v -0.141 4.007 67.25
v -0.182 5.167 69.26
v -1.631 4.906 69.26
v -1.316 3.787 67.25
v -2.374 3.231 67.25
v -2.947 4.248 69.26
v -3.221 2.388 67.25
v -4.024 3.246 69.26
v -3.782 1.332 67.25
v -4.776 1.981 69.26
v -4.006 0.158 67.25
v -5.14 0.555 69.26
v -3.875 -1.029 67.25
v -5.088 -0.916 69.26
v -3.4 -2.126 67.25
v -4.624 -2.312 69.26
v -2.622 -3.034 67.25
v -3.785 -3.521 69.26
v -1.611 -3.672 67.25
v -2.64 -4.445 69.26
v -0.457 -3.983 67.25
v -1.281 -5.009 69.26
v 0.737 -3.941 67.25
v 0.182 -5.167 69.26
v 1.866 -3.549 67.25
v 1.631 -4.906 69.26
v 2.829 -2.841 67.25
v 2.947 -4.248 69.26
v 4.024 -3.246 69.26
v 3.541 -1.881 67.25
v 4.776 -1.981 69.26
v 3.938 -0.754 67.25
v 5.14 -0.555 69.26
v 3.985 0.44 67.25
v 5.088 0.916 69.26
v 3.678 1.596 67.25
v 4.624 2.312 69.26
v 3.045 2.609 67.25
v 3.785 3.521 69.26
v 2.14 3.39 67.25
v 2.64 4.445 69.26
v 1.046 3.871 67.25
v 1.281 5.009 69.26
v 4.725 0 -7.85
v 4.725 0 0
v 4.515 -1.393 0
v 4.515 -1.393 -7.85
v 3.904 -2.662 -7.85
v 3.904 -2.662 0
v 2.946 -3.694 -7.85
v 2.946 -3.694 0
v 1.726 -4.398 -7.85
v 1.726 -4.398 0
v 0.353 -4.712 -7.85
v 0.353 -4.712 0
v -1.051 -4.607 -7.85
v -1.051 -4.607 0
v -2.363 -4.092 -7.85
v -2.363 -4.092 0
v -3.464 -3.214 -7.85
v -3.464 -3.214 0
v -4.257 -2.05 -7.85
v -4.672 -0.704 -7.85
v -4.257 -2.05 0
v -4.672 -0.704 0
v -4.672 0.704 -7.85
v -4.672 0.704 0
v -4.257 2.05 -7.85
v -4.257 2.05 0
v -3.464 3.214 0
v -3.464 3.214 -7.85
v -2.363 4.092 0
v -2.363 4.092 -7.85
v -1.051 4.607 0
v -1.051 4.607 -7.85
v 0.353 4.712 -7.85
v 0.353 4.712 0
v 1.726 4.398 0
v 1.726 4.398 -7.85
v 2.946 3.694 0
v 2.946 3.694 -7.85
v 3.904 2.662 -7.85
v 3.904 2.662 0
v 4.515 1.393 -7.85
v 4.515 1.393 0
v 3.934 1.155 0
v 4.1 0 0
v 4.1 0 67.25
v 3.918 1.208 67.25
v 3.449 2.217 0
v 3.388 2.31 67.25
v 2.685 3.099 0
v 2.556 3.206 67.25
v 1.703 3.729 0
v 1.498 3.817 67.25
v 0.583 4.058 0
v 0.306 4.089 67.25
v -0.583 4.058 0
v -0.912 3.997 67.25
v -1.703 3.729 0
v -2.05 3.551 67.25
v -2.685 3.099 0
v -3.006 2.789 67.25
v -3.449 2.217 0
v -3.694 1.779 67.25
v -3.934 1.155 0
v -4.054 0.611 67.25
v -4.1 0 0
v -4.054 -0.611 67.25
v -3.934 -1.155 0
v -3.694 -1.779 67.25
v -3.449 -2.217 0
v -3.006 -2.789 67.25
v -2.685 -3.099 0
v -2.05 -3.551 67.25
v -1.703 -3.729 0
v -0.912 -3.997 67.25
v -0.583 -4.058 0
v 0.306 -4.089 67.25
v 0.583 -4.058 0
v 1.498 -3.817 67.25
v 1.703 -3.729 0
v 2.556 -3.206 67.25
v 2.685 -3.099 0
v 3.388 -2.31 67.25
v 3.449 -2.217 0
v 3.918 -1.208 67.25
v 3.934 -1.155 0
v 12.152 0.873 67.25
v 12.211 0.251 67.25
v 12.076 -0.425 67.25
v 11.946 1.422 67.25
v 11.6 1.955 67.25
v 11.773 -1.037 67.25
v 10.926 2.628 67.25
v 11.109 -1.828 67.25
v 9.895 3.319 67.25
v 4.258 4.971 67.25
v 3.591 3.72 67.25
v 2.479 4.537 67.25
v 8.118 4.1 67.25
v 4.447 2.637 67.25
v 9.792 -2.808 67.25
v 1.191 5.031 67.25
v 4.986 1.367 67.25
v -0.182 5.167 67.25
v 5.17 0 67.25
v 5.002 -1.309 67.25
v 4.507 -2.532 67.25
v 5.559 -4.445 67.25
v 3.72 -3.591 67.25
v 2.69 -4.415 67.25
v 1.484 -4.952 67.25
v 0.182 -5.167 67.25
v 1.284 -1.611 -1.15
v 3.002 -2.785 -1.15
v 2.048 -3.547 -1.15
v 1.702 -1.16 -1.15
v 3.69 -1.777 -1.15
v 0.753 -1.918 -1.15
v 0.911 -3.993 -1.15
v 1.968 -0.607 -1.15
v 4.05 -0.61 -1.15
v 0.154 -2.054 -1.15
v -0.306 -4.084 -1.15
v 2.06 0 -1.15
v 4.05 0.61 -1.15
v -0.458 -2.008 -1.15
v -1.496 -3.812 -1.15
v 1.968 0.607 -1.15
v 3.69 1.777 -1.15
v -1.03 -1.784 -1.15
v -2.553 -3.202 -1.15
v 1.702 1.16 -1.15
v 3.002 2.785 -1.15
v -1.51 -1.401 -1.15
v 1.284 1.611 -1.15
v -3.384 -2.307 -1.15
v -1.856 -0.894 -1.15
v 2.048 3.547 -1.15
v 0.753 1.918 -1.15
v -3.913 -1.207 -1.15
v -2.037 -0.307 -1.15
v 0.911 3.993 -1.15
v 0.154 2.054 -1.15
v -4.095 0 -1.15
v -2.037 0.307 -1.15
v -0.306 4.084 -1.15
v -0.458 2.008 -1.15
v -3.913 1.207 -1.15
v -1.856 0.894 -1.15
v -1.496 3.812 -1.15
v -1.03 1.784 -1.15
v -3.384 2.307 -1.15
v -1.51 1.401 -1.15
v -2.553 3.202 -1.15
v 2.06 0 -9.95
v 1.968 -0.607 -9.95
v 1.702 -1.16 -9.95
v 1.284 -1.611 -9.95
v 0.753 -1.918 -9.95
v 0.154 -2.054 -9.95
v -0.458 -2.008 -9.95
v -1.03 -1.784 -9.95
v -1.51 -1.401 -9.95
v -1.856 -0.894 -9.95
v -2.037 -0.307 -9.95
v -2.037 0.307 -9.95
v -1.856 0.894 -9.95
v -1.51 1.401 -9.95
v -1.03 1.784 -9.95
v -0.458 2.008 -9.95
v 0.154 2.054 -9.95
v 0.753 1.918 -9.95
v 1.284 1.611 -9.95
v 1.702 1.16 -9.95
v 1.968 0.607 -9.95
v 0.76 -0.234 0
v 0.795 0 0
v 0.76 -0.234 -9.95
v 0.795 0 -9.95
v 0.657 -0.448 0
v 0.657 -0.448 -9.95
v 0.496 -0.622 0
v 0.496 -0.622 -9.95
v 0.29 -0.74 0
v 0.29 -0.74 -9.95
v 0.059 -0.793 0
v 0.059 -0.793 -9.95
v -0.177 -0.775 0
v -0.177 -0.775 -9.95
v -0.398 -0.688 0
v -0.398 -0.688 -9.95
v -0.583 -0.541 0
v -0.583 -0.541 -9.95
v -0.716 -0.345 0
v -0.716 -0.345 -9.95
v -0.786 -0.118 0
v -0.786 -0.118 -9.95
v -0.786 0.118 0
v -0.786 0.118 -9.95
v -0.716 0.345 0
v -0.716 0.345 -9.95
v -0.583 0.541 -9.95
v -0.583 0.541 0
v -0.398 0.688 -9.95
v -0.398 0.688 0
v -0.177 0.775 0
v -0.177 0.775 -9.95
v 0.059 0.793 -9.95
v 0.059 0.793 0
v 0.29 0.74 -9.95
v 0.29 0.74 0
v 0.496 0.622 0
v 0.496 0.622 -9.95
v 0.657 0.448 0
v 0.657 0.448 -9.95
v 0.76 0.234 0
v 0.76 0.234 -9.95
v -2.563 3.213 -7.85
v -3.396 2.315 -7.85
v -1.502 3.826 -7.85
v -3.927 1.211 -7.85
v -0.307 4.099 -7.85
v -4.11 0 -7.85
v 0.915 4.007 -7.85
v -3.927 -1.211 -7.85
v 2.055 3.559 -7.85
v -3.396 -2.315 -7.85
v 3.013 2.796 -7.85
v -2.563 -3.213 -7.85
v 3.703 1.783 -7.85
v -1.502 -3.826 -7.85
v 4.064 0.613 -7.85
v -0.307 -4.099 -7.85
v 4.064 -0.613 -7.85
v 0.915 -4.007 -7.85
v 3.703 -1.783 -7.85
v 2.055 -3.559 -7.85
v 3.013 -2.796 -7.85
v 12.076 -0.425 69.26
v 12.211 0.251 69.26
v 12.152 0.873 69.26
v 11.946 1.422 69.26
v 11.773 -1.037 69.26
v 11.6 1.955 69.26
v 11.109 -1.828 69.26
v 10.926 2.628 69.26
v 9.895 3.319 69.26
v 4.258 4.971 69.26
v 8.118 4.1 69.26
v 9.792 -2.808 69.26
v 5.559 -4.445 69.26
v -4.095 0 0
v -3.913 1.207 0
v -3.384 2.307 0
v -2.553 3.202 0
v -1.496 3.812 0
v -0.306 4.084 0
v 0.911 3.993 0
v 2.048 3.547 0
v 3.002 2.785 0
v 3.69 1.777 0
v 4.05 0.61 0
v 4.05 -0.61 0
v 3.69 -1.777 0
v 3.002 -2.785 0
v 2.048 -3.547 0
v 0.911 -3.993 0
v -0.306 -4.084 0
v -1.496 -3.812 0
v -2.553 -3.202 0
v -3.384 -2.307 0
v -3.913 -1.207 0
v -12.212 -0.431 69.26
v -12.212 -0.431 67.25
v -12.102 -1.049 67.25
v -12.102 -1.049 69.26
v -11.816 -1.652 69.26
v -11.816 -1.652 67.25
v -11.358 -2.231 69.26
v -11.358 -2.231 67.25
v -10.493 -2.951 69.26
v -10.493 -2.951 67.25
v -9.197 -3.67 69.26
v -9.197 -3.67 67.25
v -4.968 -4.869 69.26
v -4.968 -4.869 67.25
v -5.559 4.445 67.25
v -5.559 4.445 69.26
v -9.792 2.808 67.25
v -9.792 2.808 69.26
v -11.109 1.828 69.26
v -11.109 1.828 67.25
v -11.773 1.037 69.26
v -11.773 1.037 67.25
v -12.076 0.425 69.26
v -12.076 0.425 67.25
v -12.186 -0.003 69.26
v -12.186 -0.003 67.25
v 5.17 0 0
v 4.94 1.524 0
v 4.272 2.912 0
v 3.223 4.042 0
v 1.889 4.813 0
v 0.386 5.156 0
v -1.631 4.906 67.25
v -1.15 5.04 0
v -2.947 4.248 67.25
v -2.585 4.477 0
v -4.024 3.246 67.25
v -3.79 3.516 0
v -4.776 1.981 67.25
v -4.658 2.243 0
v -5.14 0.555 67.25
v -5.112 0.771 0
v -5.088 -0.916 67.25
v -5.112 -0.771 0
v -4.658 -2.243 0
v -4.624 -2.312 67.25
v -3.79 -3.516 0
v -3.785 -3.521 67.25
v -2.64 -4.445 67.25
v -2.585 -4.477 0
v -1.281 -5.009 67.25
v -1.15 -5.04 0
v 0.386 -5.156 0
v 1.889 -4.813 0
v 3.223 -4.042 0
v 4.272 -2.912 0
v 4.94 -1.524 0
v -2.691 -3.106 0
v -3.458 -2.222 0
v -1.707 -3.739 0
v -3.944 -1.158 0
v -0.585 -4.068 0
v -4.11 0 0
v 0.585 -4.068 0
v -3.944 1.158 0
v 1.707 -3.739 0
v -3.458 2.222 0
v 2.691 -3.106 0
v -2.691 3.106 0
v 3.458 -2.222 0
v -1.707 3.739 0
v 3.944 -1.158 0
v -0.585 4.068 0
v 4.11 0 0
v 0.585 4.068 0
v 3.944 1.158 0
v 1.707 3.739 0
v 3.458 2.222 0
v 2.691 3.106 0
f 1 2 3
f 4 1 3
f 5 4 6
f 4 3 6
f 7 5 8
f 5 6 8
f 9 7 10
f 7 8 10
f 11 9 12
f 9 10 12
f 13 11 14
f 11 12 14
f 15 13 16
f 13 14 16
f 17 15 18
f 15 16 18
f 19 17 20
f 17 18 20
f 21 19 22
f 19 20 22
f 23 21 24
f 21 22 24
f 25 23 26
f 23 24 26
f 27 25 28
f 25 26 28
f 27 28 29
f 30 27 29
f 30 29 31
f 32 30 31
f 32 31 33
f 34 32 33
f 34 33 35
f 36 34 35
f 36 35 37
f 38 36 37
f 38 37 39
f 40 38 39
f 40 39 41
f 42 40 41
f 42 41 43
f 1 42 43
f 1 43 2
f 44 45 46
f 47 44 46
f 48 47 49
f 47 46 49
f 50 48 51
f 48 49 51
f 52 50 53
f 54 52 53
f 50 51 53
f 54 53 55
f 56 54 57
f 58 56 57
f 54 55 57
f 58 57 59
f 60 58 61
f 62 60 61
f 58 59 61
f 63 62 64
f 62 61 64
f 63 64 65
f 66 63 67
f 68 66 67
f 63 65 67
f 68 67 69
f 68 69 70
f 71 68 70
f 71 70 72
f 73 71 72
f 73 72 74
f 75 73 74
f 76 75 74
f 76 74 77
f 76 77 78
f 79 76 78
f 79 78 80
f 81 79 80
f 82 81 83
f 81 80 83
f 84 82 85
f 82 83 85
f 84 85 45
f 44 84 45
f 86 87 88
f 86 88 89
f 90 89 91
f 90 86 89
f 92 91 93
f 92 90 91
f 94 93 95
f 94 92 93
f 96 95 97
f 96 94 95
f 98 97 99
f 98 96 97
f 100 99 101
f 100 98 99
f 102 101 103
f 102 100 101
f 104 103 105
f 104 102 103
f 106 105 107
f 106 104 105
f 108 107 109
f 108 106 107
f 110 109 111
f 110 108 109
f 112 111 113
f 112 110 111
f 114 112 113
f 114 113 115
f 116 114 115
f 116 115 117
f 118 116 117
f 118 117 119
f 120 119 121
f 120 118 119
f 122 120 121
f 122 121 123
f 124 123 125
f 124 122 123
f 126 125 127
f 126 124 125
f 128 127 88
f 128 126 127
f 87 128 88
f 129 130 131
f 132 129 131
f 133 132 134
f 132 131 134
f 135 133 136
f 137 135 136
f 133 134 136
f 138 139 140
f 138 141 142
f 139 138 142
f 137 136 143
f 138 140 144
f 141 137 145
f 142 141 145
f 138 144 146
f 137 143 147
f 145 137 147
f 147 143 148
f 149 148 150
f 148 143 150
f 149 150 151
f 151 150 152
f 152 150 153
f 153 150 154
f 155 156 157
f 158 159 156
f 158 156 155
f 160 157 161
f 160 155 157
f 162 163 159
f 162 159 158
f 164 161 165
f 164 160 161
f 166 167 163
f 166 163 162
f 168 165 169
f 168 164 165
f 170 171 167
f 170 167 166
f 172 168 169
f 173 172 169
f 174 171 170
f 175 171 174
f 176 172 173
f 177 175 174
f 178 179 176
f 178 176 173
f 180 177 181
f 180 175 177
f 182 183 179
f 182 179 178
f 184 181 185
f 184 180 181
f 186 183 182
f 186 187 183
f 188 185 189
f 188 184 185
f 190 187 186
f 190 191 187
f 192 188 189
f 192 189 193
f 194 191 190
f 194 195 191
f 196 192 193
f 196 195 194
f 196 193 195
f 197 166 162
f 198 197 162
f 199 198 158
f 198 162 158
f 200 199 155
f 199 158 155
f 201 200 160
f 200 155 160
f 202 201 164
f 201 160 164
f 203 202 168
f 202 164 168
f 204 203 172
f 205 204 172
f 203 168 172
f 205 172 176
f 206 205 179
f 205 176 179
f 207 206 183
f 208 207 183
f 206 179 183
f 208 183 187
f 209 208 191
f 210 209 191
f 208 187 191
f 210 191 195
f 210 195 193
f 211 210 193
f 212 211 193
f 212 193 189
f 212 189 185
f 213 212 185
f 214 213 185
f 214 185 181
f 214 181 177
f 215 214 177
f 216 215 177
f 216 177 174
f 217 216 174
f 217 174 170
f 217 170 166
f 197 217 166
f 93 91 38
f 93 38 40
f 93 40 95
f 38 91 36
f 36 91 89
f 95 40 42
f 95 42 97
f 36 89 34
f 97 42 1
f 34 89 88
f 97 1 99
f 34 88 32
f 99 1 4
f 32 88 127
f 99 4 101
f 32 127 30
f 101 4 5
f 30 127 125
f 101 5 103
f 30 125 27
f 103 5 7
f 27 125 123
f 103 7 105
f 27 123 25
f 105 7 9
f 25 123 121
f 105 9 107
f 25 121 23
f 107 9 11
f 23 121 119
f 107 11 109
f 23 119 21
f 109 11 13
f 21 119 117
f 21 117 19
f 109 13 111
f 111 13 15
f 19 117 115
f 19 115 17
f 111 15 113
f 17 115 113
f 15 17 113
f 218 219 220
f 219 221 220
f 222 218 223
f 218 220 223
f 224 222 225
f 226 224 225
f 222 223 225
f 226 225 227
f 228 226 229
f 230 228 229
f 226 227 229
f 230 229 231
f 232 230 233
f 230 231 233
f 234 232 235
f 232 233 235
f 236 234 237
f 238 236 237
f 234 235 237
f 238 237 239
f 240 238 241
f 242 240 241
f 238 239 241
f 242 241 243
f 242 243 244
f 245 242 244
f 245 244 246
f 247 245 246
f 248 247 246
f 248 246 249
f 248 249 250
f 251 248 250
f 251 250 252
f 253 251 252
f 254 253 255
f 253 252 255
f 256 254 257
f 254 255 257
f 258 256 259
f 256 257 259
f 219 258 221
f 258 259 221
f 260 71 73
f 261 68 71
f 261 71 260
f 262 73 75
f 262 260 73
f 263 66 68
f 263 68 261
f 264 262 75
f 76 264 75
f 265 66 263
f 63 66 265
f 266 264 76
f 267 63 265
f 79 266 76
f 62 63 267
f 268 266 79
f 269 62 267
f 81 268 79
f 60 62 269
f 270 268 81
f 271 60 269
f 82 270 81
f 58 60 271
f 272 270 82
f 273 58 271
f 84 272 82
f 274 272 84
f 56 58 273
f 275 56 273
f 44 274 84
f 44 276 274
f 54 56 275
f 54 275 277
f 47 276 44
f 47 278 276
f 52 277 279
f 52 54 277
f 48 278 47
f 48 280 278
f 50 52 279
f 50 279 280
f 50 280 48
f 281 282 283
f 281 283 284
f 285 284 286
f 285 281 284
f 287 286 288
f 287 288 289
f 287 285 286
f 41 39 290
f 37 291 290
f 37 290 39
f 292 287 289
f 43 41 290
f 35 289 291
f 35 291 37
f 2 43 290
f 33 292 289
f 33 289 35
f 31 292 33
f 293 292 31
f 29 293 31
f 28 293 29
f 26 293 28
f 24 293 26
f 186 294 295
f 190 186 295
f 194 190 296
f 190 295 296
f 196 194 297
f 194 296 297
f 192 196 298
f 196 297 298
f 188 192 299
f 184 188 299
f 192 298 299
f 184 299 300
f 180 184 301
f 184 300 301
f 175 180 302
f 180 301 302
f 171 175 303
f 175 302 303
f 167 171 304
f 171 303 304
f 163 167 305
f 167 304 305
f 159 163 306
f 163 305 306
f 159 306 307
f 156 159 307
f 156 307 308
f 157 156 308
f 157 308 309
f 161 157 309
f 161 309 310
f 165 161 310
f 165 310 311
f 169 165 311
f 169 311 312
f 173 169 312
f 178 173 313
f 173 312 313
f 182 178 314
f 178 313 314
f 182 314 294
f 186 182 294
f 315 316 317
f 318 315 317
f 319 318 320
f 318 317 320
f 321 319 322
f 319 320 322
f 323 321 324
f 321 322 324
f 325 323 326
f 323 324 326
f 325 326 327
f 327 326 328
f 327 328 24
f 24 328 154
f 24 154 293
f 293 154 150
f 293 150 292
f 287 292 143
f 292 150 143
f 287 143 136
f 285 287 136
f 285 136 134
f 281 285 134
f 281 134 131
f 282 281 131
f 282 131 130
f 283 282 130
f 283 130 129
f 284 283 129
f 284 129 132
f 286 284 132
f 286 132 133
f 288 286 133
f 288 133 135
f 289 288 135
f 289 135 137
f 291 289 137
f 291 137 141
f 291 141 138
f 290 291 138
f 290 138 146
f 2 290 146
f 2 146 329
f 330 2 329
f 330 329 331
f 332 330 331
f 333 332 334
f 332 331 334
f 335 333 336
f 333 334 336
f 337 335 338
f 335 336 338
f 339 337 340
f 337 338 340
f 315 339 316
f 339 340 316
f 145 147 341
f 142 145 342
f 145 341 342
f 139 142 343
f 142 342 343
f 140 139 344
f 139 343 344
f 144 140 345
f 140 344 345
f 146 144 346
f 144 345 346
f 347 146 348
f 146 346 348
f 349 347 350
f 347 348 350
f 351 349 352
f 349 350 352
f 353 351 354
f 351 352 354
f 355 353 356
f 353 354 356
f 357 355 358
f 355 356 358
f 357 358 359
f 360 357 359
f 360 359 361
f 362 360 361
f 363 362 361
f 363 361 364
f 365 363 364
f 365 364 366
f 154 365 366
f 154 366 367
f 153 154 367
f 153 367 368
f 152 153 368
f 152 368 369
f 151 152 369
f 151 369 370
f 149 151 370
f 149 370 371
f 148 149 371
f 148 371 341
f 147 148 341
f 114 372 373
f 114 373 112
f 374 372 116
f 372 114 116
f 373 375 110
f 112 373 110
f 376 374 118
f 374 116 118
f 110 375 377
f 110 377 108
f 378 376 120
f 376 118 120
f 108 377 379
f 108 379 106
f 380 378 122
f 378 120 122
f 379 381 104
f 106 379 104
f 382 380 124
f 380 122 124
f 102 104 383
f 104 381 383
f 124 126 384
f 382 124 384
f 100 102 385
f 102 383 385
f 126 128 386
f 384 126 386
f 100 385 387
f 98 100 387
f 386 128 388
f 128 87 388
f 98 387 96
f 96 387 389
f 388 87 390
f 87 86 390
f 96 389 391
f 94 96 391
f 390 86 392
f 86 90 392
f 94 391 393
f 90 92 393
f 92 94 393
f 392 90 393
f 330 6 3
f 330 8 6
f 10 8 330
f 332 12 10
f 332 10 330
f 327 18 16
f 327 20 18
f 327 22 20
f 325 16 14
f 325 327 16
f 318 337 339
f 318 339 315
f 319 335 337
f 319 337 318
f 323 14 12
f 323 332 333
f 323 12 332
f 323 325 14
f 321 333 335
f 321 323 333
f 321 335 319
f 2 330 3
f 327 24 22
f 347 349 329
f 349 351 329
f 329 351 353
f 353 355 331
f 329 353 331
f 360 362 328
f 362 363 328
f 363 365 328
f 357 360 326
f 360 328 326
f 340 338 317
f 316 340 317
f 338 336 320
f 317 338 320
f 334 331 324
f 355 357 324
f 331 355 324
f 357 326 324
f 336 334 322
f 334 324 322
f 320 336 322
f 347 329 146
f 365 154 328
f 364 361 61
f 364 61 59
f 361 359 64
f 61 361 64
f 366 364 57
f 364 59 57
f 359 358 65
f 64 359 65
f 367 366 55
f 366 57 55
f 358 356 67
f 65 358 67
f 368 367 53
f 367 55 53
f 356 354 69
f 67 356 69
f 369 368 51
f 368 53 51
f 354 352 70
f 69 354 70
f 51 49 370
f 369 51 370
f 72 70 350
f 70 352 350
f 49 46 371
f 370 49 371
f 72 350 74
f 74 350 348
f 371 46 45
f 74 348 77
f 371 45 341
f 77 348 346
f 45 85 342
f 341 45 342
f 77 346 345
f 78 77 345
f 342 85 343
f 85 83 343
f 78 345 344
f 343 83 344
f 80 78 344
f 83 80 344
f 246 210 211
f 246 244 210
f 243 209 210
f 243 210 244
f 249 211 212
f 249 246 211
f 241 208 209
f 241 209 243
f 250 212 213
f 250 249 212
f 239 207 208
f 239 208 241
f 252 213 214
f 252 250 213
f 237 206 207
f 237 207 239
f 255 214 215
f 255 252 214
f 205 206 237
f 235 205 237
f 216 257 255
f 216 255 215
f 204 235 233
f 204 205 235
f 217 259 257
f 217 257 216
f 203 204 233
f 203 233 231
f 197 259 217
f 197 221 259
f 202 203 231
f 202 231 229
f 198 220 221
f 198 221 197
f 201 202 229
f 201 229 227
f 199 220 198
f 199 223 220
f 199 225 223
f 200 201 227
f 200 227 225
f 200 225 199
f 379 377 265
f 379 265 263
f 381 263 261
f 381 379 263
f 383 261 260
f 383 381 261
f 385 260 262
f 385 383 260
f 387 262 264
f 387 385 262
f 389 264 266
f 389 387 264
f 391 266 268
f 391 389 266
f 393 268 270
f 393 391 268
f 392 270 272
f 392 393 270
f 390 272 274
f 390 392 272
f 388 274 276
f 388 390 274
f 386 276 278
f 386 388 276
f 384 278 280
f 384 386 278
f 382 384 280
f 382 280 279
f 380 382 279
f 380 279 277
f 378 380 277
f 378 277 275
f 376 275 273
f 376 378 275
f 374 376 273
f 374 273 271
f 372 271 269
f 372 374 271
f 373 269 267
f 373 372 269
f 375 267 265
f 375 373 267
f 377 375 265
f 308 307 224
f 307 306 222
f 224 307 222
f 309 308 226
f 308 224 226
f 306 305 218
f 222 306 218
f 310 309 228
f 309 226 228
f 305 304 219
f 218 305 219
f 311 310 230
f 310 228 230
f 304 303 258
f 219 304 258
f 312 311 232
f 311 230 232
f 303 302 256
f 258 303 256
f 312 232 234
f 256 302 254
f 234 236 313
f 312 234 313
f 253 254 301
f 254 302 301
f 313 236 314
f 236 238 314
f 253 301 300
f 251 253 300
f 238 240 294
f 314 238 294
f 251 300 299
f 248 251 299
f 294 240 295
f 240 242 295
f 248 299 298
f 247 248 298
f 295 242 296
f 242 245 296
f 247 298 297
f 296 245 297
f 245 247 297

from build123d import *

# Parameters (mm, degrees)
SKETCH1_R           = 5.17
SKETCH1_R_2         = 4.1
BOSS_EXTRUDE1_DEPTH = 67.25
SKETCH2_RX          = 12.22
SKETCH2_RY          = 5.17
BOSS_EXTRUDE2_DEPTH = 2.01
SKETCH3_R           = 5.17
CUT_EXTRUDE1_DEPTH  = 2.01
CUT_EXTRUDE1_DRAFT  = -30
SKETCH4_R           = 2.06
SKETCH4_R_2         = 0.795
BOSS_EXTRUDE3_DEPTH = 9.95
SKETCH5_R           = 4.0952596
BOSS_EXTRUDE4_DEPTH = 1.15
SKETCH7_R           = 0.795
CUT_EXTRUDE2_DEPTH  = 81.313643922
SKETCH9_R           = 4.725
SKETCH9_R_2         = 4.11
BOSS_EXTRUDE6_DEPTH = 7.85


with BuildPart() as part:
    # Sketch1 → Boss-Extrude1 (new body)
    with BuildSketch(Plane.XY):
        Circle(SKETCH1_R)
        Circle(SKETCH1_R_2, mode=Mode.SUBTRACT)
    extrude(amount=BOSS_EXTRUDE1_DEPTH)

    # Sketch2 → Boss-Extrude2 (add)
    with BuildSketch(Plane.XY.offset(67.25)):
        with Locations(Location((0, 0), (0, 0, -177.979667621))):
            Ellipse(SKETCH2_RX, SKETCH2_RY)
    extrude(amount=BOSS_EXTRUDE2_DEPTH)


with BuildPart() as cut_extrude1_tool:
    # Sketch3 → Cut-Extrude1 (with draft: the straight prism first)
    with BuildSketch(Plane.XY.offset(69.26)):
        with Locations(Location((0, 0, 0), (0, 0, 92.020332379))):
            Circle(SKETCH3_R)
    extrude(amount=-CUT_EXTRUDE1_DEPTH)
    # Cut-Extrude1: the draft: its side faces are tilted about the plane it starts from
    cut_extrude1_sides = [cut_extrude1_tool.faces().sort_by_distance(p)[0] for p in [
        (0.182263931, -5.166786222, 68.255),
    ]]
    draft(cut_extrude1_sides, Plane.XY.offset(69.26), CUT_EXTRUDE1_DRAFT)


with BuildPart() as part_1:
    add(part.part)

    # Cut-Extrude1: cut by cut_extrude1_tool
    add(cut_extrude1_tool.part, mode=Mode.SUBTRACT)

    # Sketch9 → Boss-Extrude6 (add)
    with BuildSketch(Plane(origin=(0, 0, 0), x_dir=(-1, 0, 0), z_dir=(0, 0, -1))):
        with Locations(Location((0, 0, 0), (0, 0, 180))):
            Circle(SKETCH9_R)
        Circle(SKETCH9_R_2, mode=Mode.SUBTRACT)
    extrude(amount=BOSS_EXTRUDE6_DEPTH)


with BuildPart() as body_2:
    # Sketch4 → Boss-Extrude3 (new body)
    with BuildSketch(Plane(origin=(0, 0, 0), x_dir=(-1, 0, 0), z_dir=(0, 0, -1))):
        with Locations(Location((0, 0, 0), (0, 0, 180))):
            Circle(SKETCH4_R)
        with Locations(Location((0, 0, 0), (0, 0, 180))):
            Circle(SKETCH4_R_2, mode=Mode.SUBTRACT)
    extrude(amount=BOSS_EXTRUDE3_DEPTH)

    # Sketch5 → Boss-Extrude4 (add)
    with BuildSketch(Plane(origin=(0, 0, 0), x_dir=(-1, 0, 0), z_dir=(0, 0, -1))):
        Circle(SKETCH5_R)
    extrude(amount=BOSS_EXTRUDE4_DEPTH)

    # Sketch7 → Cut-Extrude2 (cut, through all)
    with BuildSketch(Plane(origin=(0, 0, -9.95), x_dir=(-1, 0, 0), z_dir=(0, 0, -1))):
        with Locations(Location((0, 0, 0), (0, 0, 180))):
            Circle(SKETCH7_R)
    extrude(amount=-CUT_EXTRUDE2_DEPTH, mode=Mode.SUBTRACT)


solid = Compound([part_1.part, body_2.part])
